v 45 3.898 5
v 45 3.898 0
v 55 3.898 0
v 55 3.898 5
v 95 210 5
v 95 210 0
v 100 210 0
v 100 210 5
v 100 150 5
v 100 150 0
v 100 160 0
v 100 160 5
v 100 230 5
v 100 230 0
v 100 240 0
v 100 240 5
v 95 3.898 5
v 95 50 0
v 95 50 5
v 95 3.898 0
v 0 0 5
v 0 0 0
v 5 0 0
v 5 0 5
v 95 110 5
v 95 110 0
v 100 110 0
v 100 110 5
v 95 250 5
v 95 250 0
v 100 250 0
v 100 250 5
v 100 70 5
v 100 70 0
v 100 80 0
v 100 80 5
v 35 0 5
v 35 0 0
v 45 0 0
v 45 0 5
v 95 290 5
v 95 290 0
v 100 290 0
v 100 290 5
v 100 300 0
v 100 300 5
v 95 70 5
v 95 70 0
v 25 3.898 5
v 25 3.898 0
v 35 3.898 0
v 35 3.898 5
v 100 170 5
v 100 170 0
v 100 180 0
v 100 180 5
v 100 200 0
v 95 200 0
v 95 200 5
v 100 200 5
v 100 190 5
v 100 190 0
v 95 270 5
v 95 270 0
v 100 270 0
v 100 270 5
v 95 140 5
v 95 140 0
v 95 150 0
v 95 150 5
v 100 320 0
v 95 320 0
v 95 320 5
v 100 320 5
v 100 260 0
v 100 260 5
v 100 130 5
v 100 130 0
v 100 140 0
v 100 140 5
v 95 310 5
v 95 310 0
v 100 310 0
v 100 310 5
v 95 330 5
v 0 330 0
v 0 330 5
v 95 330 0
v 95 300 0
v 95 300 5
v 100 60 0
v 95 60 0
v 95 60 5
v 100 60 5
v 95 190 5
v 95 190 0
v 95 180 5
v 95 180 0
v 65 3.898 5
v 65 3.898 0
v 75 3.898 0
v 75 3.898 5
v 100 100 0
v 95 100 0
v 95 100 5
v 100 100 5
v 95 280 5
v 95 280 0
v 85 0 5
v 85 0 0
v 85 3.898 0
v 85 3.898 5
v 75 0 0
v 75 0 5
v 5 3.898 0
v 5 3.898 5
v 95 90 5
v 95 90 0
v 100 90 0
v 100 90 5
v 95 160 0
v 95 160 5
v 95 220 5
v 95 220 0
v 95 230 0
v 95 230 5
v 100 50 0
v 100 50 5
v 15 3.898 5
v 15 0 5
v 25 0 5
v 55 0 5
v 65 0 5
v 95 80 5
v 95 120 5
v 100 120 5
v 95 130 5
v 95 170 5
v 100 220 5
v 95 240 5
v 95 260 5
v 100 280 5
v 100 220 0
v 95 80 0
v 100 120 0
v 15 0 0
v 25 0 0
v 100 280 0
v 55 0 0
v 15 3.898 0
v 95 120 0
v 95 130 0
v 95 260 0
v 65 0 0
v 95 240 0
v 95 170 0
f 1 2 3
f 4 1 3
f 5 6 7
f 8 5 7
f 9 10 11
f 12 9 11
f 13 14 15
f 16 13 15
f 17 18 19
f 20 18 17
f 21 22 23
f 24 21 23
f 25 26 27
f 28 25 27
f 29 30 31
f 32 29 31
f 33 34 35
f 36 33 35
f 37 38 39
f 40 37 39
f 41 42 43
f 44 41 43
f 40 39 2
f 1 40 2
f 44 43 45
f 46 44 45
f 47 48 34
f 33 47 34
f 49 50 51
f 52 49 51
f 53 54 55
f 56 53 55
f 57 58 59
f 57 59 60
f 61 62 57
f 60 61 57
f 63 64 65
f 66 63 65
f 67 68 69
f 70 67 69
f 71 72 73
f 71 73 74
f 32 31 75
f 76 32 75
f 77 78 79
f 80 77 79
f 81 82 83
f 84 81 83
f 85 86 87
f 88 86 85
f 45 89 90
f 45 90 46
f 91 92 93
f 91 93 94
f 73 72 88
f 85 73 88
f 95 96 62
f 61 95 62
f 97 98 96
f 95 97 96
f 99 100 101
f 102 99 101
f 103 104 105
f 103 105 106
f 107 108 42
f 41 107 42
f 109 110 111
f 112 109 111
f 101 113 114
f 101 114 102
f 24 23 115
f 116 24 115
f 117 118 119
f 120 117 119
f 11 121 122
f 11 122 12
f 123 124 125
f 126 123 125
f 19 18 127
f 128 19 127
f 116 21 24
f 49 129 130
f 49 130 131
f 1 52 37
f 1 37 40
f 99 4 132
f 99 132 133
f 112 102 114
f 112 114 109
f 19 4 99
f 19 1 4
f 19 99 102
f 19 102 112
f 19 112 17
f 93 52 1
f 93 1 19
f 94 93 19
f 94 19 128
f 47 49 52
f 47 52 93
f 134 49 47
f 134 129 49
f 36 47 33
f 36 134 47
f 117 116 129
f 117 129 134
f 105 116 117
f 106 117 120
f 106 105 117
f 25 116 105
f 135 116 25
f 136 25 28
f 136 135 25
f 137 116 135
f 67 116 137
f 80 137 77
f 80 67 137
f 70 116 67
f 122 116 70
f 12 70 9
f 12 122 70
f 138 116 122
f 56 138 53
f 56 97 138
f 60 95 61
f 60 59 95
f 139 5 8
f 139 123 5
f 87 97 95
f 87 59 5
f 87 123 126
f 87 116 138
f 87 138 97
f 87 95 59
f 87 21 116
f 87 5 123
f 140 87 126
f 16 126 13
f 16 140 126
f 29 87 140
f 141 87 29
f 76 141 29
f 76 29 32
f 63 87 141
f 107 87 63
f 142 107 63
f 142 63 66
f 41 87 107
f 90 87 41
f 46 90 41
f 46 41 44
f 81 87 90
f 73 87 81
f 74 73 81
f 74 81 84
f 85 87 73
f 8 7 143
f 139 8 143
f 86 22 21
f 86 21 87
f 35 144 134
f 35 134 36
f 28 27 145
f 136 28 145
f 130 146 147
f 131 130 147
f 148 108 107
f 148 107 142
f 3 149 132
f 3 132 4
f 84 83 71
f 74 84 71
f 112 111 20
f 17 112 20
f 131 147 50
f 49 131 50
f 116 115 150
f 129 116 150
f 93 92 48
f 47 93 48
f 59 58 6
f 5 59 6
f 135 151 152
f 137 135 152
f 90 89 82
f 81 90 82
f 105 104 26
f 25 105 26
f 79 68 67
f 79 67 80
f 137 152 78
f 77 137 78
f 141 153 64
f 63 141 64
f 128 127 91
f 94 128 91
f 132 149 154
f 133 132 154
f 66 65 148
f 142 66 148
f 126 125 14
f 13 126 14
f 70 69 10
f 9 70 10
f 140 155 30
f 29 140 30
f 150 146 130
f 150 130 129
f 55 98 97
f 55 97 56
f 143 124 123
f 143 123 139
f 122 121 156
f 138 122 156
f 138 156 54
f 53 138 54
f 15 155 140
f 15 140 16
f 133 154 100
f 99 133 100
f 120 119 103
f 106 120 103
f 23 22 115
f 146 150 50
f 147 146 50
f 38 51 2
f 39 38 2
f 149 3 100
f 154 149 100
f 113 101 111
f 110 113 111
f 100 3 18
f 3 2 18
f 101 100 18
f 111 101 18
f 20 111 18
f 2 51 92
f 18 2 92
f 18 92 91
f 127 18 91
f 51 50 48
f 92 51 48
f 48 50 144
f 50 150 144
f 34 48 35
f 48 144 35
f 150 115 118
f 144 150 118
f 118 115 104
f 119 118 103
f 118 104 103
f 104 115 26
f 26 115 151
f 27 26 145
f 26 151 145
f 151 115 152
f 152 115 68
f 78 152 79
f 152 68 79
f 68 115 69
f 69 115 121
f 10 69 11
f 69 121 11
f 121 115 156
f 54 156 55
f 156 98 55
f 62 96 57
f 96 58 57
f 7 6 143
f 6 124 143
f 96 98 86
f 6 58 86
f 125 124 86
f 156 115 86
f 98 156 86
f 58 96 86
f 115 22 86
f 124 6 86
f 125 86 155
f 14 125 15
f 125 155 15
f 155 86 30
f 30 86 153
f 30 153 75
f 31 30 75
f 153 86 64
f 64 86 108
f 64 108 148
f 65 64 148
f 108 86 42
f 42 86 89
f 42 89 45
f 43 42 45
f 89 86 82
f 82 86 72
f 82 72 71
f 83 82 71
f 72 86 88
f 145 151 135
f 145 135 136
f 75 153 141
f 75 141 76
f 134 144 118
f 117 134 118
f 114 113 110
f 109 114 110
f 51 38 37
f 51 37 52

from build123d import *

# Parameters (mm, degrees)
ESQUISSE1_W             = 100
ESQUISSE1_H             = 330
BOSS_EXTRU_1_DEPTH      = 5
ESQUISSE3_W             = 5
ESQUISSE3_H             = 10
ESQUISSE3_W_2           = 10
ESQUISSE3_H_2           = 3.898354104
ENL_V_MAT_EXTRU_1_DEPTH = 345.85504201


with BuildPart() as part:
    # Esquisse1 → Boss.-Extru.1 (new body)
    with BuildSketch(Plane.XY):
        with Locations((50, 165)):
            Rectangle(ESQUISSE1_W, ESQUISSE1_H)
    extrude(amount=BOSS_EXTRU_1_DEPTH)

    # Esquisse3 → Enlèv. mat.-Extru.1 (cut, through all)
    with BuildSketch(Plane.XY):
        with Locations((97.5, 325)):
            Rectangle(ESQUISSE3_W, ESQUISSE3_H)
        with Locations((97.5, 305)):
            Rectangle(ESQUISSE3_W, ESQUISSE3_H)
        with Locations((97.5, 285)):
            Rectangle(ESQUISSE3_W, ESQUISSE3_H)
        with Locations((97.5, 265)):
            Rectangle(ESQUISSE3_W, ESQUISSE3_H)
        with Locations((97.5, 245)):
            Rectangle(ESQUISSE3_W, ESQUISSE3_H)
        with Locations((97.5, 225)):
            Rectangle(ESQUISSE3_W, ESQUISSE3_H)
        with Locations((97.5, 205)):
            Rectangle(ESQUISSE3_W, ESQUISSE3_H)
        with Locations((97.5, 185)):
            Rectangle(ESQUISSE3_W, ESQUISSE3_H)
        with Locations((97.5, 165)):
            Rectangle(ESQUISSE3_W, ESQUISSE3_H)
        with Locations((97.5, 145)):
            Rectangle(ESQUISSE3_W, ESQUISSE3_H)
        with Locations((97.5, 125)):
            Rectangle(ESQUISSE3_W, ESQUISSE3_H)
        with Locations((97.5, 105)):
            Rectangle(ESQUISSE3_W, ESQUISSE3_H)
        with Locations((97.5, 85)):
            Rectangle(ESQUISSE3_W, ESQUISSE3_H)
        with Locations((97.5, 65)):
            Rectangle(ESQUISSE3_W, ESQUISSE3_H)
        Polygon((100, 50), (100, 40), (100, 0), (85, 0), (85, 3.898354104), (95, 3.898354104), (95, 40), (95, 50), align=None)
        with Locations((70, 1.949177052)):
            Rectangle(ESQUISSE3_W_2, ESQUISSE3_H_2)
        with Locations((50, 1.949177052)):
            Rectangle(ESQUISSE3_W_2, ESQUISSE3_H_2)
        with Locations((30, 1.949177052)):
            Rectangle(ESQUISSE3_W_2, ESQUISSE3_H_2)
        with Locations((10, 1.949177052)):
            Rectangle(ESQUISSE3_W_2, ESQUISSE3_H_2)
    extrude(amount=ENL_V_MAT_EXTRU_1_DEPTH, mode=Mode.SUBTRACT)


solid = part.part
